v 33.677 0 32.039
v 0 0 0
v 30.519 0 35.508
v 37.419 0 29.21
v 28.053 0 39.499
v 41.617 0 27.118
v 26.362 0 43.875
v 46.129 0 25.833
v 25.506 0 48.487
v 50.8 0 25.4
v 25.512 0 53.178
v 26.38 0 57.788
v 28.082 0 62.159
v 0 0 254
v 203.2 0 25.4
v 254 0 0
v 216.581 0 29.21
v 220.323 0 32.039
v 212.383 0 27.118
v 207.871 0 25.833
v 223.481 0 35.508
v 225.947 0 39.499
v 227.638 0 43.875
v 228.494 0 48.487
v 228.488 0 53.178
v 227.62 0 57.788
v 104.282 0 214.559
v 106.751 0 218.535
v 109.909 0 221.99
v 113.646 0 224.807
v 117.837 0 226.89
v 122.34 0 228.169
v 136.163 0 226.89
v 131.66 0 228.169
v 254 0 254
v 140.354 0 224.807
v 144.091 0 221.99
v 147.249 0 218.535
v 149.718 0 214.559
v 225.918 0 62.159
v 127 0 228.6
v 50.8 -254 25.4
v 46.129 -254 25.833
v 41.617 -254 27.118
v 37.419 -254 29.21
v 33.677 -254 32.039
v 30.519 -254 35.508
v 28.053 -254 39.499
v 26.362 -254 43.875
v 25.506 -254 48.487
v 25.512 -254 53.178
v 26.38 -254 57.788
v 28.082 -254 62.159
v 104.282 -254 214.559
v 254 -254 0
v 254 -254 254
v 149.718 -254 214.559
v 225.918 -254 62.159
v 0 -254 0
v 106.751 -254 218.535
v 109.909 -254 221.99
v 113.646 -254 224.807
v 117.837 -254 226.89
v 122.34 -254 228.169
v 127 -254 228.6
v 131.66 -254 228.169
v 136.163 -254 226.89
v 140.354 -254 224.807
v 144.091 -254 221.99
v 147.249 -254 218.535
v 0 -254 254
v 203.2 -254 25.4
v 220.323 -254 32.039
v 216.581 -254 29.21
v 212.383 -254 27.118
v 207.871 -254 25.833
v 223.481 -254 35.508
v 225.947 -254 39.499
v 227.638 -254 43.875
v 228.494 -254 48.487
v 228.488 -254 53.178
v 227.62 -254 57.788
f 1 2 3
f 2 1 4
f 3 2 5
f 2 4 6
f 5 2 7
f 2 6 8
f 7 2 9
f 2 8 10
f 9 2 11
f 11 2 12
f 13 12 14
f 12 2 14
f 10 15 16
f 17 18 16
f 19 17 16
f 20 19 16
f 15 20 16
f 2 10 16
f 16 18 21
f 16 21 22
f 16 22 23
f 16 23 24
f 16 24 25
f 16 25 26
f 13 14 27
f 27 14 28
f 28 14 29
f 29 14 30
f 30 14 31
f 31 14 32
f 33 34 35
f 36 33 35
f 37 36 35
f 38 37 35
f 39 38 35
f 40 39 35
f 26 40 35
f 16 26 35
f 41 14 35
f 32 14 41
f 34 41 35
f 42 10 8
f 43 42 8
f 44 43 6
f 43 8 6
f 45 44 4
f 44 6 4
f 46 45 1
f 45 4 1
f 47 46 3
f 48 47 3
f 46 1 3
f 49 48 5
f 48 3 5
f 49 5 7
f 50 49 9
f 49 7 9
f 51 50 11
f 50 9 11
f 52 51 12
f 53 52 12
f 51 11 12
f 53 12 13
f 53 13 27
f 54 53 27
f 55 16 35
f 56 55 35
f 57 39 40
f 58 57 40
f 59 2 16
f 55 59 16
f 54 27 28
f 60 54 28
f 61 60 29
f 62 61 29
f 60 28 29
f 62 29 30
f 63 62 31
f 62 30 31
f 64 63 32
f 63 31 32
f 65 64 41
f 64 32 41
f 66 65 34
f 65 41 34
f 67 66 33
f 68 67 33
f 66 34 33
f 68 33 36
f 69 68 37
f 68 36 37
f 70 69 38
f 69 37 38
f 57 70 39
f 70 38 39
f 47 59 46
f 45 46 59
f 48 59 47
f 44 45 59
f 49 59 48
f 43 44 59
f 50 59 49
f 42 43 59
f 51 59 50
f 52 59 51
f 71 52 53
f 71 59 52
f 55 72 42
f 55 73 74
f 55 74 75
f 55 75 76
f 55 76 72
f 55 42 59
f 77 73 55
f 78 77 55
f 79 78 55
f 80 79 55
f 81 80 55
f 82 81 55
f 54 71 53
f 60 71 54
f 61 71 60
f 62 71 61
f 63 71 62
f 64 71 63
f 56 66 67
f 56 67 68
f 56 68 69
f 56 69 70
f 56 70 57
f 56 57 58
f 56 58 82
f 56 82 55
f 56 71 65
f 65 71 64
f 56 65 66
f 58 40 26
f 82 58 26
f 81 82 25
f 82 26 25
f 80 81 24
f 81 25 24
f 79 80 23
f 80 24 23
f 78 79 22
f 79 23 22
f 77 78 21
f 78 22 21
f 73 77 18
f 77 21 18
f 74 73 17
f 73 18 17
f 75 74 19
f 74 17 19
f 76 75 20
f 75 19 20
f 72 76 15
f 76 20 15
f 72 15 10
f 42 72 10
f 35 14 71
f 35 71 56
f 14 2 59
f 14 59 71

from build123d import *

# Parameters (mm, degrees)
F0_W     = 254
F0_H     = 254
F1_DEPTH = 254


with BuildPart() as f1:
    # F0 (on Front) → F1 (new body)
    with BuildSketch(Plane.XZ):
        with Locations((127, 127)):
            Rectangle(F0_W, F0_H)
        with BuildLine():
            ThreePointArc((50.8, 25.4), (29.193469, 37.44643), (28.081549, 62.159225))
            Line((28.081549, 62.159225), (104.281549, 214.559225))
            ThreePointArc((104.281549, 214.559225), (127, 228.6), (149.718451, 214.559225))
            Line((149.718451, 214.559225), (225.918451, 62.159225))
            ThreePointArc((225.918451, 62.159225), (224.806531, 37.44643), (203.2, 25.4))
            Line((203.2, 25.4), (50.8, 25.4))
        make_face(mode=Mode.SUBTRACT)
    extrude(amount=F1_DEPTH)


solid = f1.part
